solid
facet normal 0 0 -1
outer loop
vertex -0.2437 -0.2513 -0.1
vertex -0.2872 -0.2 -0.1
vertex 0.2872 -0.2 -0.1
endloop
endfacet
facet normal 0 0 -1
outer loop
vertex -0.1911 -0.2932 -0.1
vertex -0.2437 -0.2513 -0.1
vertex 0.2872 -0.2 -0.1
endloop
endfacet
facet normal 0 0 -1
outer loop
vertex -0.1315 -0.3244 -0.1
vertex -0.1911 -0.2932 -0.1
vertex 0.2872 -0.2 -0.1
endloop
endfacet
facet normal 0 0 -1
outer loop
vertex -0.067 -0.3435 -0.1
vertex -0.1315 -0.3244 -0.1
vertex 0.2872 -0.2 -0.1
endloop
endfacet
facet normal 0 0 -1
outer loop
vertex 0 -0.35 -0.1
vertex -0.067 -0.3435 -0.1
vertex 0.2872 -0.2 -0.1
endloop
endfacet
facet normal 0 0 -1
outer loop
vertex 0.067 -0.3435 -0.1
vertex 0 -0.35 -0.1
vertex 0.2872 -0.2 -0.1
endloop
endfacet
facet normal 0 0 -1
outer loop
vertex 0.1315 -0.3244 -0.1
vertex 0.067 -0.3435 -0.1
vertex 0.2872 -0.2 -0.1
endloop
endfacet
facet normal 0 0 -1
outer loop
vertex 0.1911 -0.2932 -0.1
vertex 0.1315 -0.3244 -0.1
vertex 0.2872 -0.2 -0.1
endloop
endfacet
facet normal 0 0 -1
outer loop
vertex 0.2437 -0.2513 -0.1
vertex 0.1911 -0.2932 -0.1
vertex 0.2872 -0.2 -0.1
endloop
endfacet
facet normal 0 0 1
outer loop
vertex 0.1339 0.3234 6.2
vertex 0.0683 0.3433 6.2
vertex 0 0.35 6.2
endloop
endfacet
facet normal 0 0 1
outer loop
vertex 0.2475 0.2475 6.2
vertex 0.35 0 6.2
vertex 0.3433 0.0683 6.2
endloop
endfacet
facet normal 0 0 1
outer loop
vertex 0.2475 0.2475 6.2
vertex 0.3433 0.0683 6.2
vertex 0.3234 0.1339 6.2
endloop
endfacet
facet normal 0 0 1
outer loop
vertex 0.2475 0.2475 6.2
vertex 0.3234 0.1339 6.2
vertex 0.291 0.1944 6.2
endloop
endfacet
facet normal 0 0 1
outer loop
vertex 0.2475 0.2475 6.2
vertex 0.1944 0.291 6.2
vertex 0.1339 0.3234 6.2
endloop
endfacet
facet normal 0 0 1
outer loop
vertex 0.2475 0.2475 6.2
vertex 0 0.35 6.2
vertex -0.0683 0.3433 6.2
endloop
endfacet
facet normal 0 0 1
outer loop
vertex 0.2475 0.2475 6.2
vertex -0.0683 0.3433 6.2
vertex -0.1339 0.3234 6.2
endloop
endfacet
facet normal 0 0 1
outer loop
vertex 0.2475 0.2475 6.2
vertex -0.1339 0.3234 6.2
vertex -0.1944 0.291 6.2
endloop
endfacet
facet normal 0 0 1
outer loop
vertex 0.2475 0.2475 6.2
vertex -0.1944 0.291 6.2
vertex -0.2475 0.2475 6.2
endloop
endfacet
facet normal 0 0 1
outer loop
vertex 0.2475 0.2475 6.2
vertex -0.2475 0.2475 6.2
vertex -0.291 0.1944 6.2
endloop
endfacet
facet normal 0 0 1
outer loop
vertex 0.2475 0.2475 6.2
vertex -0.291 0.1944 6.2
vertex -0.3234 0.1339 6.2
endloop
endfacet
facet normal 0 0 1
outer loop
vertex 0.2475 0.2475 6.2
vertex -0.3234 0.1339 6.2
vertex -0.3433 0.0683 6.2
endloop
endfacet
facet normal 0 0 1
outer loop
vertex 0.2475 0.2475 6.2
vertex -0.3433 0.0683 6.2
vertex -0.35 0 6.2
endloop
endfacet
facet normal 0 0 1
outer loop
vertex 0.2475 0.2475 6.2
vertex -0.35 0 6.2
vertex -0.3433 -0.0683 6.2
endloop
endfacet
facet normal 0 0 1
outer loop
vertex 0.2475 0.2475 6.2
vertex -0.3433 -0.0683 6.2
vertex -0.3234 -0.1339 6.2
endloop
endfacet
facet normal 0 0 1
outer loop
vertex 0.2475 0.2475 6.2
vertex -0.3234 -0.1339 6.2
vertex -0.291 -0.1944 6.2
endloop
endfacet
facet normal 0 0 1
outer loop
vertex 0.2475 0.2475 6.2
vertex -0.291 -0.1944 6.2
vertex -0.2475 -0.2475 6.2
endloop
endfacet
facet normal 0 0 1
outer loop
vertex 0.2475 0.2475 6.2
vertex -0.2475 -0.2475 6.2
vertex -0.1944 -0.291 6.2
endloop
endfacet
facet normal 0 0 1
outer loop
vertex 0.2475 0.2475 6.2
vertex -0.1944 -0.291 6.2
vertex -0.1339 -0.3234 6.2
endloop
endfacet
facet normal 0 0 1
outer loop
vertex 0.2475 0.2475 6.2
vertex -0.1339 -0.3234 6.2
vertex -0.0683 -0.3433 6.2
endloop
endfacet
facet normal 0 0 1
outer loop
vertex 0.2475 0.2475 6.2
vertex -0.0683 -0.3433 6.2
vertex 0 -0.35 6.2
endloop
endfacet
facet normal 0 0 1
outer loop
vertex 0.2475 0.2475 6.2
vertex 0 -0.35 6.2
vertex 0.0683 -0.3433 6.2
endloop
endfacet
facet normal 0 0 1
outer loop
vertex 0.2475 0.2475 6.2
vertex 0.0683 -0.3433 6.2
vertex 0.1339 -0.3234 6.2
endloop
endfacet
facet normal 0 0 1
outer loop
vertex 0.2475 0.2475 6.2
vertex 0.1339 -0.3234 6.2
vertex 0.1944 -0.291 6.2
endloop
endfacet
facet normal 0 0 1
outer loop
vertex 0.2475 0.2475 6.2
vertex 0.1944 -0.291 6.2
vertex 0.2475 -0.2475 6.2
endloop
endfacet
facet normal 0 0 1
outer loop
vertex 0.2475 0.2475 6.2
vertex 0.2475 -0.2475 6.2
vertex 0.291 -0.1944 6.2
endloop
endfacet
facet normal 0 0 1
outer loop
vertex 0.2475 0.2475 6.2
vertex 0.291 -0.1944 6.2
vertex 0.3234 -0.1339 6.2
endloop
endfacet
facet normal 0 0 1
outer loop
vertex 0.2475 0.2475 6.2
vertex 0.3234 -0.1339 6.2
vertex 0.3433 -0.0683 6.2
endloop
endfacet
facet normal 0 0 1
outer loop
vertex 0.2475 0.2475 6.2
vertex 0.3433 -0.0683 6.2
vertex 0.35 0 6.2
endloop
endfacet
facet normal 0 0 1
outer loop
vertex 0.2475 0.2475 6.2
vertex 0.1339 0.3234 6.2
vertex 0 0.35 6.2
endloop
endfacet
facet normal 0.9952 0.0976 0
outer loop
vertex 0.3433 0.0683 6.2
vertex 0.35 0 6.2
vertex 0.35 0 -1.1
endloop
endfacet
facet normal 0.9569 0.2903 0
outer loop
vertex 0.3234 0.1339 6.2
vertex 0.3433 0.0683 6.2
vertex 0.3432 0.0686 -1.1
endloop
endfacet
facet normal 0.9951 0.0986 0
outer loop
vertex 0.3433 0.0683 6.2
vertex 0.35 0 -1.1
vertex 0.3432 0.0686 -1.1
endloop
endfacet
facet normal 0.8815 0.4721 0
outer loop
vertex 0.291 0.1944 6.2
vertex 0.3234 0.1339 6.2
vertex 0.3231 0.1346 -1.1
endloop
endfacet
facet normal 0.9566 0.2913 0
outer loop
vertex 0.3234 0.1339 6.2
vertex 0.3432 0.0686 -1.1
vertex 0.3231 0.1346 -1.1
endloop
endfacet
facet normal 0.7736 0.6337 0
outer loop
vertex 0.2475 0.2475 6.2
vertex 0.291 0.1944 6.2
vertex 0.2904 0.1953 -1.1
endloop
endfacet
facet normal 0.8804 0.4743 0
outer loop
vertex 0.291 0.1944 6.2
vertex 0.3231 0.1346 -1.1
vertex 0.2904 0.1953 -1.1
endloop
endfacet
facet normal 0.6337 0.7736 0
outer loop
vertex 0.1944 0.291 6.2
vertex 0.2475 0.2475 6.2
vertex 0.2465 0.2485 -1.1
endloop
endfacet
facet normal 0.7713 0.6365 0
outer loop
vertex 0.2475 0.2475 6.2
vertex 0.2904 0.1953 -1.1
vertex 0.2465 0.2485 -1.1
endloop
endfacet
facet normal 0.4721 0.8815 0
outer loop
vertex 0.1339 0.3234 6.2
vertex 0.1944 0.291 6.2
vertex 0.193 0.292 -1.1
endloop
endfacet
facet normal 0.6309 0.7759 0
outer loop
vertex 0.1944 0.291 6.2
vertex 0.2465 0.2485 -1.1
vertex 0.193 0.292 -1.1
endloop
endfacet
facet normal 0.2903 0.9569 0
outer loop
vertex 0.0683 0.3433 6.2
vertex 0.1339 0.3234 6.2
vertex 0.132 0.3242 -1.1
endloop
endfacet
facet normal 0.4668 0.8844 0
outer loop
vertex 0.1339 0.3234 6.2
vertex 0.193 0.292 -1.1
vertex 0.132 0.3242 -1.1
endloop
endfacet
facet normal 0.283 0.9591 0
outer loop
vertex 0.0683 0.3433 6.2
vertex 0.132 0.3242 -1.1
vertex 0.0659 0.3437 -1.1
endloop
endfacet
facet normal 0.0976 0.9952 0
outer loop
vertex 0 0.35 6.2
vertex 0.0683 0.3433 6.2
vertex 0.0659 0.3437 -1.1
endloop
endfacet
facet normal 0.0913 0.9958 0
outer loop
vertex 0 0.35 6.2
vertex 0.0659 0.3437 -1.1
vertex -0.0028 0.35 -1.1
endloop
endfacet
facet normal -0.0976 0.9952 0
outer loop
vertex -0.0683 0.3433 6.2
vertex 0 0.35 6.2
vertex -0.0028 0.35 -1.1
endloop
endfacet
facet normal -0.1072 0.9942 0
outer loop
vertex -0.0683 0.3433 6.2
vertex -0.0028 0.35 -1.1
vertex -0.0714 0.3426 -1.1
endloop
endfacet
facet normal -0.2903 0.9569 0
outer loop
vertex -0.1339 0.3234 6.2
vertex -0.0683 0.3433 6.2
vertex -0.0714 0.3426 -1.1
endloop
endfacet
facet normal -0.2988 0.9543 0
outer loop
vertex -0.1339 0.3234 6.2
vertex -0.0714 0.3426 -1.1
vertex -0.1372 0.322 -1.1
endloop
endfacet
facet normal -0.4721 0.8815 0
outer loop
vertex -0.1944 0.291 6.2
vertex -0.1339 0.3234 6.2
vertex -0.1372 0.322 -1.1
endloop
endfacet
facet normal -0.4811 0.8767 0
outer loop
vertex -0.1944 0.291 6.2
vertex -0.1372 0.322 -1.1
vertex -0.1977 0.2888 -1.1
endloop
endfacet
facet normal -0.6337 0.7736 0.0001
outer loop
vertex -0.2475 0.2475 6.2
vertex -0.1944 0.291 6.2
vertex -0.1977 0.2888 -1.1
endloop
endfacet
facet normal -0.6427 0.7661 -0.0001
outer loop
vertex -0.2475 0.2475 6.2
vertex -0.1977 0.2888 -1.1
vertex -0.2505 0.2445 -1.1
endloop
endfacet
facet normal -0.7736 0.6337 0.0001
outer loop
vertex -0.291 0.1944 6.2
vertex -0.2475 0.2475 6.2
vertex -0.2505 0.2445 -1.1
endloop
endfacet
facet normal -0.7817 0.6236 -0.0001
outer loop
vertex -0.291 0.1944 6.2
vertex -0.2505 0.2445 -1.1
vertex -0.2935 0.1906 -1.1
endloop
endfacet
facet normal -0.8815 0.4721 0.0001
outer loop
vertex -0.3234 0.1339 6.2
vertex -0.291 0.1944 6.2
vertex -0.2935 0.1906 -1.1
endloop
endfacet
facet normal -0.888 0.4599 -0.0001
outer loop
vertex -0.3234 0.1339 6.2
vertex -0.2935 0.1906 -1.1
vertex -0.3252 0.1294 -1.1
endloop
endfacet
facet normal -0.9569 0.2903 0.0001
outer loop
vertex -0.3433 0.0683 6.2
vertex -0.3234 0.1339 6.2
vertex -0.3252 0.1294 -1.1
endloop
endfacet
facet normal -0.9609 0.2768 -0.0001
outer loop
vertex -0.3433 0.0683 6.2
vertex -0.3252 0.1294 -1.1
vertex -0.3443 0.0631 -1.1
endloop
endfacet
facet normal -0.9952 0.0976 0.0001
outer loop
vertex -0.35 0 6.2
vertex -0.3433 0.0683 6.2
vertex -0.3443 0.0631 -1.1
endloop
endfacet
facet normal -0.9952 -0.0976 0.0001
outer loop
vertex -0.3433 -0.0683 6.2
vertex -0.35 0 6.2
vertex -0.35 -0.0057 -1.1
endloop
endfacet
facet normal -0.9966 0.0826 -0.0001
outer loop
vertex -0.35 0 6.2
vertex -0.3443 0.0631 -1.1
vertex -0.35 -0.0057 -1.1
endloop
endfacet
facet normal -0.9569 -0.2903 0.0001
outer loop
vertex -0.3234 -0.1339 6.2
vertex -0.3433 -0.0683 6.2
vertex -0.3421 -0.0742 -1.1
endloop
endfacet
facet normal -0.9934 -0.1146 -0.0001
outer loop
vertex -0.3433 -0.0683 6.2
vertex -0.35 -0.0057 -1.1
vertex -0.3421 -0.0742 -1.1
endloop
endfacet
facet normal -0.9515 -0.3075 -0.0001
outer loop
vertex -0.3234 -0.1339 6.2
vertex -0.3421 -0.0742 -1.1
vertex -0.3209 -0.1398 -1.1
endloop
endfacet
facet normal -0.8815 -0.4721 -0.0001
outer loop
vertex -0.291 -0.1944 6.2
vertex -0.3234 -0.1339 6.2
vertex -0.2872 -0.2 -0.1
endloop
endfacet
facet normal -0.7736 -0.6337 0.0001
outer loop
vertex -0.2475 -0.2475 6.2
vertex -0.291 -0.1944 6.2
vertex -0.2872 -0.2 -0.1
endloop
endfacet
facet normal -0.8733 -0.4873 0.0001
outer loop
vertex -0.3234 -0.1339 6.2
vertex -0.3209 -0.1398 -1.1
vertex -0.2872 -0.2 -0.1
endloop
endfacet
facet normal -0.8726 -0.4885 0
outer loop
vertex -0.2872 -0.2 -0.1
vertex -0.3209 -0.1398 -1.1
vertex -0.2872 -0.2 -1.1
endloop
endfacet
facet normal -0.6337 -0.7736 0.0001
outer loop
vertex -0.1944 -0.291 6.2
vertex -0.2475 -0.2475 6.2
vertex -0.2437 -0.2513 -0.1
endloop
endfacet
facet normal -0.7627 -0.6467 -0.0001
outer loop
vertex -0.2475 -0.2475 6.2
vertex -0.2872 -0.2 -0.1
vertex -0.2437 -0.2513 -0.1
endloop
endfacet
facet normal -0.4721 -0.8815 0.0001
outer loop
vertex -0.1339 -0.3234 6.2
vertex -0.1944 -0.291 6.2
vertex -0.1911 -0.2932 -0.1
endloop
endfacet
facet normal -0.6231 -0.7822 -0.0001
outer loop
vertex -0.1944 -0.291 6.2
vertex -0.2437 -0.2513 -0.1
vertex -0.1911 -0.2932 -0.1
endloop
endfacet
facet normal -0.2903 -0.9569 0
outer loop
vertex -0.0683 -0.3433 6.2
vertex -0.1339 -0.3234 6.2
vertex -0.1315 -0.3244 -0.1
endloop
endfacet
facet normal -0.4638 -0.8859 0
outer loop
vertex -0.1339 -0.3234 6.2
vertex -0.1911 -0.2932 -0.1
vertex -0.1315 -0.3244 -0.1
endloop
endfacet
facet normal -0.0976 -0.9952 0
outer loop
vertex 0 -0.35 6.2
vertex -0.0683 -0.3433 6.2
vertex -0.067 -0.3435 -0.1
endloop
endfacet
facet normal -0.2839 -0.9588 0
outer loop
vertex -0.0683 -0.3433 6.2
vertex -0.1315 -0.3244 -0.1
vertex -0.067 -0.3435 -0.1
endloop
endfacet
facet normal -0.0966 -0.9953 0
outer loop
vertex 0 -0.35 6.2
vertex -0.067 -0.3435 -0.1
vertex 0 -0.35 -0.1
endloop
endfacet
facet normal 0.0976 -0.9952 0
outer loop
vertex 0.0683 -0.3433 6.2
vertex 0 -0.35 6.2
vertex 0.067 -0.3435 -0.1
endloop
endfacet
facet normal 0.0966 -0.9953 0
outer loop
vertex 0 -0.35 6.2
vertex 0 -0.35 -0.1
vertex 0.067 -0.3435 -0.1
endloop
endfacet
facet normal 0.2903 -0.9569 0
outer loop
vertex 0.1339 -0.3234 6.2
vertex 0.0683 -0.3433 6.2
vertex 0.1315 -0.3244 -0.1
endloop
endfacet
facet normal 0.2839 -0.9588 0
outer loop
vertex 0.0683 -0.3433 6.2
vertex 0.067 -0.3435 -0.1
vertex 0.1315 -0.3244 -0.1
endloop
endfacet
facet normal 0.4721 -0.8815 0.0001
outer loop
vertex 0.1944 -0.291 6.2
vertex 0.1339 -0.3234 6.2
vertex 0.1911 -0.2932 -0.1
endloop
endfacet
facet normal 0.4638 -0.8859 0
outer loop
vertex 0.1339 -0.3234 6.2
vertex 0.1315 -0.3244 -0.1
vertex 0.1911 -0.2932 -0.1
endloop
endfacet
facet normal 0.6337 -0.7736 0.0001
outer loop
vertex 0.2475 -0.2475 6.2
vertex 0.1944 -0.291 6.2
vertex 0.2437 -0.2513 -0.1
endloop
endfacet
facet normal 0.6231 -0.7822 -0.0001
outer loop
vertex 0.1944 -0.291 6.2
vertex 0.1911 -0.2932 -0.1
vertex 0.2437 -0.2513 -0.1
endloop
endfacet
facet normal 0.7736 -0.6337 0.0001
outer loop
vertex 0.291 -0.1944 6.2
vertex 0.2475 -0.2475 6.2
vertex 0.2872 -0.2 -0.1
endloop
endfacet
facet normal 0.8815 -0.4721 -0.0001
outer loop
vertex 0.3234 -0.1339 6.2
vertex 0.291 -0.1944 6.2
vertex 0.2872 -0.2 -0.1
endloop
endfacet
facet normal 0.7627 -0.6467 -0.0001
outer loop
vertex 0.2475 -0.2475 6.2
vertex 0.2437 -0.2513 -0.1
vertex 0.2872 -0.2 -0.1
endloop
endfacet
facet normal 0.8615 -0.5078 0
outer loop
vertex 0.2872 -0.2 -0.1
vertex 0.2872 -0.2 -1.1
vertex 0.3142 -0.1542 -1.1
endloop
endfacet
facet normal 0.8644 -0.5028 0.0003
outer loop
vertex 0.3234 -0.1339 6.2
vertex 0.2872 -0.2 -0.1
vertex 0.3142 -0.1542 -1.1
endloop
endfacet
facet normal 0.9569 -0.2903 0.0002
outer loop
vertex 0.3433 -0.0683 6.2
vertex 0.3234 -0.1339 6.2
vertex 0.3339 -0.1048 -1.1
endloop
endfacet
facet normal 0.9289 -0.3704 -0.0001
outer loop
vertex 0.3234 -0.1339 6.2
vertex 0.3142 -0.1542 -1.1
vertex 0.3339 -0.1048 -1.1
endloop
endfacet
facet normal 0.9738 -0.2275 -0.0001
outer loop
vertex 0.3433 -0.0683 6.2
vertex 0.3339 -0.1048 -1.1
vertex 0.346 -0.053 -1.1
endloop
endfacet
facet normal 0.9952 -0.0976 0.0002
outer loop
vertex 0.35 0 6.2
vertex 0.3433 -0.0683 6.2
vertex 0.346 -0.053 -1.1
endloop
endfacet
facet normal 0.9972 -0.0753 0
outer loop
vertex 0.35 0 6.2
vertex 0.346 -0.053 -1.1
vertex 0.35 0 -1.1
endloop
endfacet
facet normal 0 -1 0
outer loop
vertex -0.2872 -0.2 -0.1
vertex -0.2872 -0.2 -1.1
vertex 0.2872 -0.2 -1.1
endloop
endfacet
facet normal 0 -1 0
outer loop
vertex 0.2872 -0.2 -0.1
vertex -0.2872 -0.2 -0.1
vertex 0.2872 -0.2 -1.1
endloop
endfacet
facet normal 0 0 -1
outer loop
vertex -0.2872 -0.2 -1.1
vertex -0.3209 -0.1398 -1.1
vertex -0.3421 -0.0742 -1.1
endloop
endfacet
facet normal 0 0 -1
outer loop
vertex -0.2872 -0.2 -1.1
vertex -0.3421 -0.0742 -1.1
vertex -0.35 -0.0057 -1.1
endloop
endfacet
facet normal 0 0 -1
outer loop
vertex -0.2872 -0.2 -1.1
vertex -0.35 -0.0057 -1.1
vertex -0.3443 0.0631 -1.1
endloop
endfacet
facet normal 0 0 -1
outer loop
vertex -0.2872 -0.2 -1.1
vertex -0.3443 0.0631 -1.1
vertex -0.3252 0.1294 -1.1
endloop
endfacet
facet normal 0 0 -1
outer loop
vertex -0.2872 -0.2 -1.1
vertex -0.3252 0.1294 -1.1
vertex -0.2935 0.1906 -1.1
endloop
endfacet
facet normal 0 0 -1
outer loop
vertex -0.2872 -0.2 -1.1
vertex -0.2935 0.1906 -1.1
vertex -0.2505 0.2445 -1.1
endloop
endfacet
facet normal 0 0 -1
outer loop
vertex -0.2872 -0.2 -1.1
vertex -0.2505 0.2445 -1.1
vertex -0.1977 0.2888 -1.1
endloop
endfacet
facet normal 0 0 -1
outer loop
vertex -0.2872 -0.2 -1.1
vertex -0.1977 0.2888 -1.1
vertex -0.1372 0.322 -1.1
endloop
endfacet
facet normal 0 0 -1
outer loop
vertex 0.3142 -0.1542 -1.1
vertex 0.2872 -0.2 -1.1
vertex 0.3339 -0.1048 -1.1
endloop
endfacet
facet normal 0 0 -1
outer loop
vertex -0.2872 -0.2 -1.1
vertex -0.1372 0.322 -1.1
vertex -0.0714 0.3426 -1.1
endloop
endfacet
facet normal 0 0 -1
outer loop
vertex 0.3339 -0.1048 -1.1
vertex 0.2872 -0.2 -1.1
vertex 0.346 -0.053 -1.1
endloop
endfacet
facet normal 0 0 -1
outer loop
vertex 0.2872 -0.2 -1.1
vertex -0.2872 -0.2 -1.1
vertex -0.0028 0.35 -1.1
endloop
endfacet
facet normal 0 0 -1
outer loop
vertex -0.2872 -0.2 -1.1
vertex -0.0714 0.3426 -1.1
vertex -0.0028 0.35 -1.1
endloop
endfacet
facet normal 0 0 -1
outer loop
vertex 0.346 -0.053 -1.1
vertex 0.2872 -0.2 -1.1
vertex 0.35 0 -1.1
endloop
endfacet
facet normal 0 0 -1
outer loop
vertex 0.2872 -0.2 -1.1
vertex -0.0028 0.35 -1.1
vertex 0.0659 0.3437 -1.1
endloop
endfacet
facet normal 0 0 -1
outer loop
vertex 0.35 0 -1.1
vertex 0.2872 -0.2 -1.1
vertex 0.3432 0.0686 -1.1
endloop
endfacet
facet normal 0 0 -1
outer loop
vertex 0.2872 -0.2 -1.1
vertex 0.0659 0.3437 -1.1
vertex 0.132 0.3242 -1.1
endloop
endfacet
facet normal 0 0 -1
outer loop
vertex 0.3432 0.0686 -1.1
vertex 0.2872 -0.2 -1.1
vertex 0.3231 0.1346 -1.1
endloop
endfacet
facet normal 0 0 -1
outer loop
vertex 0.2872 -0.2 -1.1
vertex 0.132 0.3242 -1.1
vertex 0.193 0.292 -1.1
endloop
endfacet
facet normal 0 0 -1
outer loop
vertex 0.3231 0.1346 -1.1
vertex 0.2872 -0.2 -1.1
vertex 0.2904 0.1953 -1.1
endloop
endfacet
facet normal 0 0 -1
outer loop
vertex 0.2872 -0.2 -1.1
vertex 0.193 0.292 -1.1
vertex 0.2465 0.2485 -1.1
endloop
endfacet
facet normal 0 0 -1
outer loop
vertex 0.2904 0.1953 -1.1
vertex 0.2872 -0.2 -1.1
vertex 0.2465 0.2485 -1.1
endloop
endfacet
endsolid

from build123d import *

# Parameters (mm, degrees)
EXTRUDE004_DEPTH  = 1
CYLINDER005_R     = 0.35
CYLINDER005_DEPTH = 7.3


with BuildPart() as extrude004:
    # Sketch (on Cylinder) → Extrude004 (new body)
    with BuildSketch(Plane.XY.offset(-1.1)):
        with BuildLine():
            ThreePointArc((-0.287228, -0.2), (0, -0.35), (0.287228, -0.2))
            Line((-0.287228, -0.2), (0.287228, -0.2))
        make_face()
    extrude(amount=EXTRUDE004_DEPTH)


with BuildPart() as shaft:
    # Cylinder005 → Cylinder005 (new body)
    with BuildSketch(Plane.XY.offset(-1.1)):
        Circle(CYLINDER005_R)
    extrude(amount=CYLINDER005_DEPTH)

    # Cut005: cut Extrude004
    add(extrude004.part, mode=Mode.SUBTRACT)


solid = shaft.part
